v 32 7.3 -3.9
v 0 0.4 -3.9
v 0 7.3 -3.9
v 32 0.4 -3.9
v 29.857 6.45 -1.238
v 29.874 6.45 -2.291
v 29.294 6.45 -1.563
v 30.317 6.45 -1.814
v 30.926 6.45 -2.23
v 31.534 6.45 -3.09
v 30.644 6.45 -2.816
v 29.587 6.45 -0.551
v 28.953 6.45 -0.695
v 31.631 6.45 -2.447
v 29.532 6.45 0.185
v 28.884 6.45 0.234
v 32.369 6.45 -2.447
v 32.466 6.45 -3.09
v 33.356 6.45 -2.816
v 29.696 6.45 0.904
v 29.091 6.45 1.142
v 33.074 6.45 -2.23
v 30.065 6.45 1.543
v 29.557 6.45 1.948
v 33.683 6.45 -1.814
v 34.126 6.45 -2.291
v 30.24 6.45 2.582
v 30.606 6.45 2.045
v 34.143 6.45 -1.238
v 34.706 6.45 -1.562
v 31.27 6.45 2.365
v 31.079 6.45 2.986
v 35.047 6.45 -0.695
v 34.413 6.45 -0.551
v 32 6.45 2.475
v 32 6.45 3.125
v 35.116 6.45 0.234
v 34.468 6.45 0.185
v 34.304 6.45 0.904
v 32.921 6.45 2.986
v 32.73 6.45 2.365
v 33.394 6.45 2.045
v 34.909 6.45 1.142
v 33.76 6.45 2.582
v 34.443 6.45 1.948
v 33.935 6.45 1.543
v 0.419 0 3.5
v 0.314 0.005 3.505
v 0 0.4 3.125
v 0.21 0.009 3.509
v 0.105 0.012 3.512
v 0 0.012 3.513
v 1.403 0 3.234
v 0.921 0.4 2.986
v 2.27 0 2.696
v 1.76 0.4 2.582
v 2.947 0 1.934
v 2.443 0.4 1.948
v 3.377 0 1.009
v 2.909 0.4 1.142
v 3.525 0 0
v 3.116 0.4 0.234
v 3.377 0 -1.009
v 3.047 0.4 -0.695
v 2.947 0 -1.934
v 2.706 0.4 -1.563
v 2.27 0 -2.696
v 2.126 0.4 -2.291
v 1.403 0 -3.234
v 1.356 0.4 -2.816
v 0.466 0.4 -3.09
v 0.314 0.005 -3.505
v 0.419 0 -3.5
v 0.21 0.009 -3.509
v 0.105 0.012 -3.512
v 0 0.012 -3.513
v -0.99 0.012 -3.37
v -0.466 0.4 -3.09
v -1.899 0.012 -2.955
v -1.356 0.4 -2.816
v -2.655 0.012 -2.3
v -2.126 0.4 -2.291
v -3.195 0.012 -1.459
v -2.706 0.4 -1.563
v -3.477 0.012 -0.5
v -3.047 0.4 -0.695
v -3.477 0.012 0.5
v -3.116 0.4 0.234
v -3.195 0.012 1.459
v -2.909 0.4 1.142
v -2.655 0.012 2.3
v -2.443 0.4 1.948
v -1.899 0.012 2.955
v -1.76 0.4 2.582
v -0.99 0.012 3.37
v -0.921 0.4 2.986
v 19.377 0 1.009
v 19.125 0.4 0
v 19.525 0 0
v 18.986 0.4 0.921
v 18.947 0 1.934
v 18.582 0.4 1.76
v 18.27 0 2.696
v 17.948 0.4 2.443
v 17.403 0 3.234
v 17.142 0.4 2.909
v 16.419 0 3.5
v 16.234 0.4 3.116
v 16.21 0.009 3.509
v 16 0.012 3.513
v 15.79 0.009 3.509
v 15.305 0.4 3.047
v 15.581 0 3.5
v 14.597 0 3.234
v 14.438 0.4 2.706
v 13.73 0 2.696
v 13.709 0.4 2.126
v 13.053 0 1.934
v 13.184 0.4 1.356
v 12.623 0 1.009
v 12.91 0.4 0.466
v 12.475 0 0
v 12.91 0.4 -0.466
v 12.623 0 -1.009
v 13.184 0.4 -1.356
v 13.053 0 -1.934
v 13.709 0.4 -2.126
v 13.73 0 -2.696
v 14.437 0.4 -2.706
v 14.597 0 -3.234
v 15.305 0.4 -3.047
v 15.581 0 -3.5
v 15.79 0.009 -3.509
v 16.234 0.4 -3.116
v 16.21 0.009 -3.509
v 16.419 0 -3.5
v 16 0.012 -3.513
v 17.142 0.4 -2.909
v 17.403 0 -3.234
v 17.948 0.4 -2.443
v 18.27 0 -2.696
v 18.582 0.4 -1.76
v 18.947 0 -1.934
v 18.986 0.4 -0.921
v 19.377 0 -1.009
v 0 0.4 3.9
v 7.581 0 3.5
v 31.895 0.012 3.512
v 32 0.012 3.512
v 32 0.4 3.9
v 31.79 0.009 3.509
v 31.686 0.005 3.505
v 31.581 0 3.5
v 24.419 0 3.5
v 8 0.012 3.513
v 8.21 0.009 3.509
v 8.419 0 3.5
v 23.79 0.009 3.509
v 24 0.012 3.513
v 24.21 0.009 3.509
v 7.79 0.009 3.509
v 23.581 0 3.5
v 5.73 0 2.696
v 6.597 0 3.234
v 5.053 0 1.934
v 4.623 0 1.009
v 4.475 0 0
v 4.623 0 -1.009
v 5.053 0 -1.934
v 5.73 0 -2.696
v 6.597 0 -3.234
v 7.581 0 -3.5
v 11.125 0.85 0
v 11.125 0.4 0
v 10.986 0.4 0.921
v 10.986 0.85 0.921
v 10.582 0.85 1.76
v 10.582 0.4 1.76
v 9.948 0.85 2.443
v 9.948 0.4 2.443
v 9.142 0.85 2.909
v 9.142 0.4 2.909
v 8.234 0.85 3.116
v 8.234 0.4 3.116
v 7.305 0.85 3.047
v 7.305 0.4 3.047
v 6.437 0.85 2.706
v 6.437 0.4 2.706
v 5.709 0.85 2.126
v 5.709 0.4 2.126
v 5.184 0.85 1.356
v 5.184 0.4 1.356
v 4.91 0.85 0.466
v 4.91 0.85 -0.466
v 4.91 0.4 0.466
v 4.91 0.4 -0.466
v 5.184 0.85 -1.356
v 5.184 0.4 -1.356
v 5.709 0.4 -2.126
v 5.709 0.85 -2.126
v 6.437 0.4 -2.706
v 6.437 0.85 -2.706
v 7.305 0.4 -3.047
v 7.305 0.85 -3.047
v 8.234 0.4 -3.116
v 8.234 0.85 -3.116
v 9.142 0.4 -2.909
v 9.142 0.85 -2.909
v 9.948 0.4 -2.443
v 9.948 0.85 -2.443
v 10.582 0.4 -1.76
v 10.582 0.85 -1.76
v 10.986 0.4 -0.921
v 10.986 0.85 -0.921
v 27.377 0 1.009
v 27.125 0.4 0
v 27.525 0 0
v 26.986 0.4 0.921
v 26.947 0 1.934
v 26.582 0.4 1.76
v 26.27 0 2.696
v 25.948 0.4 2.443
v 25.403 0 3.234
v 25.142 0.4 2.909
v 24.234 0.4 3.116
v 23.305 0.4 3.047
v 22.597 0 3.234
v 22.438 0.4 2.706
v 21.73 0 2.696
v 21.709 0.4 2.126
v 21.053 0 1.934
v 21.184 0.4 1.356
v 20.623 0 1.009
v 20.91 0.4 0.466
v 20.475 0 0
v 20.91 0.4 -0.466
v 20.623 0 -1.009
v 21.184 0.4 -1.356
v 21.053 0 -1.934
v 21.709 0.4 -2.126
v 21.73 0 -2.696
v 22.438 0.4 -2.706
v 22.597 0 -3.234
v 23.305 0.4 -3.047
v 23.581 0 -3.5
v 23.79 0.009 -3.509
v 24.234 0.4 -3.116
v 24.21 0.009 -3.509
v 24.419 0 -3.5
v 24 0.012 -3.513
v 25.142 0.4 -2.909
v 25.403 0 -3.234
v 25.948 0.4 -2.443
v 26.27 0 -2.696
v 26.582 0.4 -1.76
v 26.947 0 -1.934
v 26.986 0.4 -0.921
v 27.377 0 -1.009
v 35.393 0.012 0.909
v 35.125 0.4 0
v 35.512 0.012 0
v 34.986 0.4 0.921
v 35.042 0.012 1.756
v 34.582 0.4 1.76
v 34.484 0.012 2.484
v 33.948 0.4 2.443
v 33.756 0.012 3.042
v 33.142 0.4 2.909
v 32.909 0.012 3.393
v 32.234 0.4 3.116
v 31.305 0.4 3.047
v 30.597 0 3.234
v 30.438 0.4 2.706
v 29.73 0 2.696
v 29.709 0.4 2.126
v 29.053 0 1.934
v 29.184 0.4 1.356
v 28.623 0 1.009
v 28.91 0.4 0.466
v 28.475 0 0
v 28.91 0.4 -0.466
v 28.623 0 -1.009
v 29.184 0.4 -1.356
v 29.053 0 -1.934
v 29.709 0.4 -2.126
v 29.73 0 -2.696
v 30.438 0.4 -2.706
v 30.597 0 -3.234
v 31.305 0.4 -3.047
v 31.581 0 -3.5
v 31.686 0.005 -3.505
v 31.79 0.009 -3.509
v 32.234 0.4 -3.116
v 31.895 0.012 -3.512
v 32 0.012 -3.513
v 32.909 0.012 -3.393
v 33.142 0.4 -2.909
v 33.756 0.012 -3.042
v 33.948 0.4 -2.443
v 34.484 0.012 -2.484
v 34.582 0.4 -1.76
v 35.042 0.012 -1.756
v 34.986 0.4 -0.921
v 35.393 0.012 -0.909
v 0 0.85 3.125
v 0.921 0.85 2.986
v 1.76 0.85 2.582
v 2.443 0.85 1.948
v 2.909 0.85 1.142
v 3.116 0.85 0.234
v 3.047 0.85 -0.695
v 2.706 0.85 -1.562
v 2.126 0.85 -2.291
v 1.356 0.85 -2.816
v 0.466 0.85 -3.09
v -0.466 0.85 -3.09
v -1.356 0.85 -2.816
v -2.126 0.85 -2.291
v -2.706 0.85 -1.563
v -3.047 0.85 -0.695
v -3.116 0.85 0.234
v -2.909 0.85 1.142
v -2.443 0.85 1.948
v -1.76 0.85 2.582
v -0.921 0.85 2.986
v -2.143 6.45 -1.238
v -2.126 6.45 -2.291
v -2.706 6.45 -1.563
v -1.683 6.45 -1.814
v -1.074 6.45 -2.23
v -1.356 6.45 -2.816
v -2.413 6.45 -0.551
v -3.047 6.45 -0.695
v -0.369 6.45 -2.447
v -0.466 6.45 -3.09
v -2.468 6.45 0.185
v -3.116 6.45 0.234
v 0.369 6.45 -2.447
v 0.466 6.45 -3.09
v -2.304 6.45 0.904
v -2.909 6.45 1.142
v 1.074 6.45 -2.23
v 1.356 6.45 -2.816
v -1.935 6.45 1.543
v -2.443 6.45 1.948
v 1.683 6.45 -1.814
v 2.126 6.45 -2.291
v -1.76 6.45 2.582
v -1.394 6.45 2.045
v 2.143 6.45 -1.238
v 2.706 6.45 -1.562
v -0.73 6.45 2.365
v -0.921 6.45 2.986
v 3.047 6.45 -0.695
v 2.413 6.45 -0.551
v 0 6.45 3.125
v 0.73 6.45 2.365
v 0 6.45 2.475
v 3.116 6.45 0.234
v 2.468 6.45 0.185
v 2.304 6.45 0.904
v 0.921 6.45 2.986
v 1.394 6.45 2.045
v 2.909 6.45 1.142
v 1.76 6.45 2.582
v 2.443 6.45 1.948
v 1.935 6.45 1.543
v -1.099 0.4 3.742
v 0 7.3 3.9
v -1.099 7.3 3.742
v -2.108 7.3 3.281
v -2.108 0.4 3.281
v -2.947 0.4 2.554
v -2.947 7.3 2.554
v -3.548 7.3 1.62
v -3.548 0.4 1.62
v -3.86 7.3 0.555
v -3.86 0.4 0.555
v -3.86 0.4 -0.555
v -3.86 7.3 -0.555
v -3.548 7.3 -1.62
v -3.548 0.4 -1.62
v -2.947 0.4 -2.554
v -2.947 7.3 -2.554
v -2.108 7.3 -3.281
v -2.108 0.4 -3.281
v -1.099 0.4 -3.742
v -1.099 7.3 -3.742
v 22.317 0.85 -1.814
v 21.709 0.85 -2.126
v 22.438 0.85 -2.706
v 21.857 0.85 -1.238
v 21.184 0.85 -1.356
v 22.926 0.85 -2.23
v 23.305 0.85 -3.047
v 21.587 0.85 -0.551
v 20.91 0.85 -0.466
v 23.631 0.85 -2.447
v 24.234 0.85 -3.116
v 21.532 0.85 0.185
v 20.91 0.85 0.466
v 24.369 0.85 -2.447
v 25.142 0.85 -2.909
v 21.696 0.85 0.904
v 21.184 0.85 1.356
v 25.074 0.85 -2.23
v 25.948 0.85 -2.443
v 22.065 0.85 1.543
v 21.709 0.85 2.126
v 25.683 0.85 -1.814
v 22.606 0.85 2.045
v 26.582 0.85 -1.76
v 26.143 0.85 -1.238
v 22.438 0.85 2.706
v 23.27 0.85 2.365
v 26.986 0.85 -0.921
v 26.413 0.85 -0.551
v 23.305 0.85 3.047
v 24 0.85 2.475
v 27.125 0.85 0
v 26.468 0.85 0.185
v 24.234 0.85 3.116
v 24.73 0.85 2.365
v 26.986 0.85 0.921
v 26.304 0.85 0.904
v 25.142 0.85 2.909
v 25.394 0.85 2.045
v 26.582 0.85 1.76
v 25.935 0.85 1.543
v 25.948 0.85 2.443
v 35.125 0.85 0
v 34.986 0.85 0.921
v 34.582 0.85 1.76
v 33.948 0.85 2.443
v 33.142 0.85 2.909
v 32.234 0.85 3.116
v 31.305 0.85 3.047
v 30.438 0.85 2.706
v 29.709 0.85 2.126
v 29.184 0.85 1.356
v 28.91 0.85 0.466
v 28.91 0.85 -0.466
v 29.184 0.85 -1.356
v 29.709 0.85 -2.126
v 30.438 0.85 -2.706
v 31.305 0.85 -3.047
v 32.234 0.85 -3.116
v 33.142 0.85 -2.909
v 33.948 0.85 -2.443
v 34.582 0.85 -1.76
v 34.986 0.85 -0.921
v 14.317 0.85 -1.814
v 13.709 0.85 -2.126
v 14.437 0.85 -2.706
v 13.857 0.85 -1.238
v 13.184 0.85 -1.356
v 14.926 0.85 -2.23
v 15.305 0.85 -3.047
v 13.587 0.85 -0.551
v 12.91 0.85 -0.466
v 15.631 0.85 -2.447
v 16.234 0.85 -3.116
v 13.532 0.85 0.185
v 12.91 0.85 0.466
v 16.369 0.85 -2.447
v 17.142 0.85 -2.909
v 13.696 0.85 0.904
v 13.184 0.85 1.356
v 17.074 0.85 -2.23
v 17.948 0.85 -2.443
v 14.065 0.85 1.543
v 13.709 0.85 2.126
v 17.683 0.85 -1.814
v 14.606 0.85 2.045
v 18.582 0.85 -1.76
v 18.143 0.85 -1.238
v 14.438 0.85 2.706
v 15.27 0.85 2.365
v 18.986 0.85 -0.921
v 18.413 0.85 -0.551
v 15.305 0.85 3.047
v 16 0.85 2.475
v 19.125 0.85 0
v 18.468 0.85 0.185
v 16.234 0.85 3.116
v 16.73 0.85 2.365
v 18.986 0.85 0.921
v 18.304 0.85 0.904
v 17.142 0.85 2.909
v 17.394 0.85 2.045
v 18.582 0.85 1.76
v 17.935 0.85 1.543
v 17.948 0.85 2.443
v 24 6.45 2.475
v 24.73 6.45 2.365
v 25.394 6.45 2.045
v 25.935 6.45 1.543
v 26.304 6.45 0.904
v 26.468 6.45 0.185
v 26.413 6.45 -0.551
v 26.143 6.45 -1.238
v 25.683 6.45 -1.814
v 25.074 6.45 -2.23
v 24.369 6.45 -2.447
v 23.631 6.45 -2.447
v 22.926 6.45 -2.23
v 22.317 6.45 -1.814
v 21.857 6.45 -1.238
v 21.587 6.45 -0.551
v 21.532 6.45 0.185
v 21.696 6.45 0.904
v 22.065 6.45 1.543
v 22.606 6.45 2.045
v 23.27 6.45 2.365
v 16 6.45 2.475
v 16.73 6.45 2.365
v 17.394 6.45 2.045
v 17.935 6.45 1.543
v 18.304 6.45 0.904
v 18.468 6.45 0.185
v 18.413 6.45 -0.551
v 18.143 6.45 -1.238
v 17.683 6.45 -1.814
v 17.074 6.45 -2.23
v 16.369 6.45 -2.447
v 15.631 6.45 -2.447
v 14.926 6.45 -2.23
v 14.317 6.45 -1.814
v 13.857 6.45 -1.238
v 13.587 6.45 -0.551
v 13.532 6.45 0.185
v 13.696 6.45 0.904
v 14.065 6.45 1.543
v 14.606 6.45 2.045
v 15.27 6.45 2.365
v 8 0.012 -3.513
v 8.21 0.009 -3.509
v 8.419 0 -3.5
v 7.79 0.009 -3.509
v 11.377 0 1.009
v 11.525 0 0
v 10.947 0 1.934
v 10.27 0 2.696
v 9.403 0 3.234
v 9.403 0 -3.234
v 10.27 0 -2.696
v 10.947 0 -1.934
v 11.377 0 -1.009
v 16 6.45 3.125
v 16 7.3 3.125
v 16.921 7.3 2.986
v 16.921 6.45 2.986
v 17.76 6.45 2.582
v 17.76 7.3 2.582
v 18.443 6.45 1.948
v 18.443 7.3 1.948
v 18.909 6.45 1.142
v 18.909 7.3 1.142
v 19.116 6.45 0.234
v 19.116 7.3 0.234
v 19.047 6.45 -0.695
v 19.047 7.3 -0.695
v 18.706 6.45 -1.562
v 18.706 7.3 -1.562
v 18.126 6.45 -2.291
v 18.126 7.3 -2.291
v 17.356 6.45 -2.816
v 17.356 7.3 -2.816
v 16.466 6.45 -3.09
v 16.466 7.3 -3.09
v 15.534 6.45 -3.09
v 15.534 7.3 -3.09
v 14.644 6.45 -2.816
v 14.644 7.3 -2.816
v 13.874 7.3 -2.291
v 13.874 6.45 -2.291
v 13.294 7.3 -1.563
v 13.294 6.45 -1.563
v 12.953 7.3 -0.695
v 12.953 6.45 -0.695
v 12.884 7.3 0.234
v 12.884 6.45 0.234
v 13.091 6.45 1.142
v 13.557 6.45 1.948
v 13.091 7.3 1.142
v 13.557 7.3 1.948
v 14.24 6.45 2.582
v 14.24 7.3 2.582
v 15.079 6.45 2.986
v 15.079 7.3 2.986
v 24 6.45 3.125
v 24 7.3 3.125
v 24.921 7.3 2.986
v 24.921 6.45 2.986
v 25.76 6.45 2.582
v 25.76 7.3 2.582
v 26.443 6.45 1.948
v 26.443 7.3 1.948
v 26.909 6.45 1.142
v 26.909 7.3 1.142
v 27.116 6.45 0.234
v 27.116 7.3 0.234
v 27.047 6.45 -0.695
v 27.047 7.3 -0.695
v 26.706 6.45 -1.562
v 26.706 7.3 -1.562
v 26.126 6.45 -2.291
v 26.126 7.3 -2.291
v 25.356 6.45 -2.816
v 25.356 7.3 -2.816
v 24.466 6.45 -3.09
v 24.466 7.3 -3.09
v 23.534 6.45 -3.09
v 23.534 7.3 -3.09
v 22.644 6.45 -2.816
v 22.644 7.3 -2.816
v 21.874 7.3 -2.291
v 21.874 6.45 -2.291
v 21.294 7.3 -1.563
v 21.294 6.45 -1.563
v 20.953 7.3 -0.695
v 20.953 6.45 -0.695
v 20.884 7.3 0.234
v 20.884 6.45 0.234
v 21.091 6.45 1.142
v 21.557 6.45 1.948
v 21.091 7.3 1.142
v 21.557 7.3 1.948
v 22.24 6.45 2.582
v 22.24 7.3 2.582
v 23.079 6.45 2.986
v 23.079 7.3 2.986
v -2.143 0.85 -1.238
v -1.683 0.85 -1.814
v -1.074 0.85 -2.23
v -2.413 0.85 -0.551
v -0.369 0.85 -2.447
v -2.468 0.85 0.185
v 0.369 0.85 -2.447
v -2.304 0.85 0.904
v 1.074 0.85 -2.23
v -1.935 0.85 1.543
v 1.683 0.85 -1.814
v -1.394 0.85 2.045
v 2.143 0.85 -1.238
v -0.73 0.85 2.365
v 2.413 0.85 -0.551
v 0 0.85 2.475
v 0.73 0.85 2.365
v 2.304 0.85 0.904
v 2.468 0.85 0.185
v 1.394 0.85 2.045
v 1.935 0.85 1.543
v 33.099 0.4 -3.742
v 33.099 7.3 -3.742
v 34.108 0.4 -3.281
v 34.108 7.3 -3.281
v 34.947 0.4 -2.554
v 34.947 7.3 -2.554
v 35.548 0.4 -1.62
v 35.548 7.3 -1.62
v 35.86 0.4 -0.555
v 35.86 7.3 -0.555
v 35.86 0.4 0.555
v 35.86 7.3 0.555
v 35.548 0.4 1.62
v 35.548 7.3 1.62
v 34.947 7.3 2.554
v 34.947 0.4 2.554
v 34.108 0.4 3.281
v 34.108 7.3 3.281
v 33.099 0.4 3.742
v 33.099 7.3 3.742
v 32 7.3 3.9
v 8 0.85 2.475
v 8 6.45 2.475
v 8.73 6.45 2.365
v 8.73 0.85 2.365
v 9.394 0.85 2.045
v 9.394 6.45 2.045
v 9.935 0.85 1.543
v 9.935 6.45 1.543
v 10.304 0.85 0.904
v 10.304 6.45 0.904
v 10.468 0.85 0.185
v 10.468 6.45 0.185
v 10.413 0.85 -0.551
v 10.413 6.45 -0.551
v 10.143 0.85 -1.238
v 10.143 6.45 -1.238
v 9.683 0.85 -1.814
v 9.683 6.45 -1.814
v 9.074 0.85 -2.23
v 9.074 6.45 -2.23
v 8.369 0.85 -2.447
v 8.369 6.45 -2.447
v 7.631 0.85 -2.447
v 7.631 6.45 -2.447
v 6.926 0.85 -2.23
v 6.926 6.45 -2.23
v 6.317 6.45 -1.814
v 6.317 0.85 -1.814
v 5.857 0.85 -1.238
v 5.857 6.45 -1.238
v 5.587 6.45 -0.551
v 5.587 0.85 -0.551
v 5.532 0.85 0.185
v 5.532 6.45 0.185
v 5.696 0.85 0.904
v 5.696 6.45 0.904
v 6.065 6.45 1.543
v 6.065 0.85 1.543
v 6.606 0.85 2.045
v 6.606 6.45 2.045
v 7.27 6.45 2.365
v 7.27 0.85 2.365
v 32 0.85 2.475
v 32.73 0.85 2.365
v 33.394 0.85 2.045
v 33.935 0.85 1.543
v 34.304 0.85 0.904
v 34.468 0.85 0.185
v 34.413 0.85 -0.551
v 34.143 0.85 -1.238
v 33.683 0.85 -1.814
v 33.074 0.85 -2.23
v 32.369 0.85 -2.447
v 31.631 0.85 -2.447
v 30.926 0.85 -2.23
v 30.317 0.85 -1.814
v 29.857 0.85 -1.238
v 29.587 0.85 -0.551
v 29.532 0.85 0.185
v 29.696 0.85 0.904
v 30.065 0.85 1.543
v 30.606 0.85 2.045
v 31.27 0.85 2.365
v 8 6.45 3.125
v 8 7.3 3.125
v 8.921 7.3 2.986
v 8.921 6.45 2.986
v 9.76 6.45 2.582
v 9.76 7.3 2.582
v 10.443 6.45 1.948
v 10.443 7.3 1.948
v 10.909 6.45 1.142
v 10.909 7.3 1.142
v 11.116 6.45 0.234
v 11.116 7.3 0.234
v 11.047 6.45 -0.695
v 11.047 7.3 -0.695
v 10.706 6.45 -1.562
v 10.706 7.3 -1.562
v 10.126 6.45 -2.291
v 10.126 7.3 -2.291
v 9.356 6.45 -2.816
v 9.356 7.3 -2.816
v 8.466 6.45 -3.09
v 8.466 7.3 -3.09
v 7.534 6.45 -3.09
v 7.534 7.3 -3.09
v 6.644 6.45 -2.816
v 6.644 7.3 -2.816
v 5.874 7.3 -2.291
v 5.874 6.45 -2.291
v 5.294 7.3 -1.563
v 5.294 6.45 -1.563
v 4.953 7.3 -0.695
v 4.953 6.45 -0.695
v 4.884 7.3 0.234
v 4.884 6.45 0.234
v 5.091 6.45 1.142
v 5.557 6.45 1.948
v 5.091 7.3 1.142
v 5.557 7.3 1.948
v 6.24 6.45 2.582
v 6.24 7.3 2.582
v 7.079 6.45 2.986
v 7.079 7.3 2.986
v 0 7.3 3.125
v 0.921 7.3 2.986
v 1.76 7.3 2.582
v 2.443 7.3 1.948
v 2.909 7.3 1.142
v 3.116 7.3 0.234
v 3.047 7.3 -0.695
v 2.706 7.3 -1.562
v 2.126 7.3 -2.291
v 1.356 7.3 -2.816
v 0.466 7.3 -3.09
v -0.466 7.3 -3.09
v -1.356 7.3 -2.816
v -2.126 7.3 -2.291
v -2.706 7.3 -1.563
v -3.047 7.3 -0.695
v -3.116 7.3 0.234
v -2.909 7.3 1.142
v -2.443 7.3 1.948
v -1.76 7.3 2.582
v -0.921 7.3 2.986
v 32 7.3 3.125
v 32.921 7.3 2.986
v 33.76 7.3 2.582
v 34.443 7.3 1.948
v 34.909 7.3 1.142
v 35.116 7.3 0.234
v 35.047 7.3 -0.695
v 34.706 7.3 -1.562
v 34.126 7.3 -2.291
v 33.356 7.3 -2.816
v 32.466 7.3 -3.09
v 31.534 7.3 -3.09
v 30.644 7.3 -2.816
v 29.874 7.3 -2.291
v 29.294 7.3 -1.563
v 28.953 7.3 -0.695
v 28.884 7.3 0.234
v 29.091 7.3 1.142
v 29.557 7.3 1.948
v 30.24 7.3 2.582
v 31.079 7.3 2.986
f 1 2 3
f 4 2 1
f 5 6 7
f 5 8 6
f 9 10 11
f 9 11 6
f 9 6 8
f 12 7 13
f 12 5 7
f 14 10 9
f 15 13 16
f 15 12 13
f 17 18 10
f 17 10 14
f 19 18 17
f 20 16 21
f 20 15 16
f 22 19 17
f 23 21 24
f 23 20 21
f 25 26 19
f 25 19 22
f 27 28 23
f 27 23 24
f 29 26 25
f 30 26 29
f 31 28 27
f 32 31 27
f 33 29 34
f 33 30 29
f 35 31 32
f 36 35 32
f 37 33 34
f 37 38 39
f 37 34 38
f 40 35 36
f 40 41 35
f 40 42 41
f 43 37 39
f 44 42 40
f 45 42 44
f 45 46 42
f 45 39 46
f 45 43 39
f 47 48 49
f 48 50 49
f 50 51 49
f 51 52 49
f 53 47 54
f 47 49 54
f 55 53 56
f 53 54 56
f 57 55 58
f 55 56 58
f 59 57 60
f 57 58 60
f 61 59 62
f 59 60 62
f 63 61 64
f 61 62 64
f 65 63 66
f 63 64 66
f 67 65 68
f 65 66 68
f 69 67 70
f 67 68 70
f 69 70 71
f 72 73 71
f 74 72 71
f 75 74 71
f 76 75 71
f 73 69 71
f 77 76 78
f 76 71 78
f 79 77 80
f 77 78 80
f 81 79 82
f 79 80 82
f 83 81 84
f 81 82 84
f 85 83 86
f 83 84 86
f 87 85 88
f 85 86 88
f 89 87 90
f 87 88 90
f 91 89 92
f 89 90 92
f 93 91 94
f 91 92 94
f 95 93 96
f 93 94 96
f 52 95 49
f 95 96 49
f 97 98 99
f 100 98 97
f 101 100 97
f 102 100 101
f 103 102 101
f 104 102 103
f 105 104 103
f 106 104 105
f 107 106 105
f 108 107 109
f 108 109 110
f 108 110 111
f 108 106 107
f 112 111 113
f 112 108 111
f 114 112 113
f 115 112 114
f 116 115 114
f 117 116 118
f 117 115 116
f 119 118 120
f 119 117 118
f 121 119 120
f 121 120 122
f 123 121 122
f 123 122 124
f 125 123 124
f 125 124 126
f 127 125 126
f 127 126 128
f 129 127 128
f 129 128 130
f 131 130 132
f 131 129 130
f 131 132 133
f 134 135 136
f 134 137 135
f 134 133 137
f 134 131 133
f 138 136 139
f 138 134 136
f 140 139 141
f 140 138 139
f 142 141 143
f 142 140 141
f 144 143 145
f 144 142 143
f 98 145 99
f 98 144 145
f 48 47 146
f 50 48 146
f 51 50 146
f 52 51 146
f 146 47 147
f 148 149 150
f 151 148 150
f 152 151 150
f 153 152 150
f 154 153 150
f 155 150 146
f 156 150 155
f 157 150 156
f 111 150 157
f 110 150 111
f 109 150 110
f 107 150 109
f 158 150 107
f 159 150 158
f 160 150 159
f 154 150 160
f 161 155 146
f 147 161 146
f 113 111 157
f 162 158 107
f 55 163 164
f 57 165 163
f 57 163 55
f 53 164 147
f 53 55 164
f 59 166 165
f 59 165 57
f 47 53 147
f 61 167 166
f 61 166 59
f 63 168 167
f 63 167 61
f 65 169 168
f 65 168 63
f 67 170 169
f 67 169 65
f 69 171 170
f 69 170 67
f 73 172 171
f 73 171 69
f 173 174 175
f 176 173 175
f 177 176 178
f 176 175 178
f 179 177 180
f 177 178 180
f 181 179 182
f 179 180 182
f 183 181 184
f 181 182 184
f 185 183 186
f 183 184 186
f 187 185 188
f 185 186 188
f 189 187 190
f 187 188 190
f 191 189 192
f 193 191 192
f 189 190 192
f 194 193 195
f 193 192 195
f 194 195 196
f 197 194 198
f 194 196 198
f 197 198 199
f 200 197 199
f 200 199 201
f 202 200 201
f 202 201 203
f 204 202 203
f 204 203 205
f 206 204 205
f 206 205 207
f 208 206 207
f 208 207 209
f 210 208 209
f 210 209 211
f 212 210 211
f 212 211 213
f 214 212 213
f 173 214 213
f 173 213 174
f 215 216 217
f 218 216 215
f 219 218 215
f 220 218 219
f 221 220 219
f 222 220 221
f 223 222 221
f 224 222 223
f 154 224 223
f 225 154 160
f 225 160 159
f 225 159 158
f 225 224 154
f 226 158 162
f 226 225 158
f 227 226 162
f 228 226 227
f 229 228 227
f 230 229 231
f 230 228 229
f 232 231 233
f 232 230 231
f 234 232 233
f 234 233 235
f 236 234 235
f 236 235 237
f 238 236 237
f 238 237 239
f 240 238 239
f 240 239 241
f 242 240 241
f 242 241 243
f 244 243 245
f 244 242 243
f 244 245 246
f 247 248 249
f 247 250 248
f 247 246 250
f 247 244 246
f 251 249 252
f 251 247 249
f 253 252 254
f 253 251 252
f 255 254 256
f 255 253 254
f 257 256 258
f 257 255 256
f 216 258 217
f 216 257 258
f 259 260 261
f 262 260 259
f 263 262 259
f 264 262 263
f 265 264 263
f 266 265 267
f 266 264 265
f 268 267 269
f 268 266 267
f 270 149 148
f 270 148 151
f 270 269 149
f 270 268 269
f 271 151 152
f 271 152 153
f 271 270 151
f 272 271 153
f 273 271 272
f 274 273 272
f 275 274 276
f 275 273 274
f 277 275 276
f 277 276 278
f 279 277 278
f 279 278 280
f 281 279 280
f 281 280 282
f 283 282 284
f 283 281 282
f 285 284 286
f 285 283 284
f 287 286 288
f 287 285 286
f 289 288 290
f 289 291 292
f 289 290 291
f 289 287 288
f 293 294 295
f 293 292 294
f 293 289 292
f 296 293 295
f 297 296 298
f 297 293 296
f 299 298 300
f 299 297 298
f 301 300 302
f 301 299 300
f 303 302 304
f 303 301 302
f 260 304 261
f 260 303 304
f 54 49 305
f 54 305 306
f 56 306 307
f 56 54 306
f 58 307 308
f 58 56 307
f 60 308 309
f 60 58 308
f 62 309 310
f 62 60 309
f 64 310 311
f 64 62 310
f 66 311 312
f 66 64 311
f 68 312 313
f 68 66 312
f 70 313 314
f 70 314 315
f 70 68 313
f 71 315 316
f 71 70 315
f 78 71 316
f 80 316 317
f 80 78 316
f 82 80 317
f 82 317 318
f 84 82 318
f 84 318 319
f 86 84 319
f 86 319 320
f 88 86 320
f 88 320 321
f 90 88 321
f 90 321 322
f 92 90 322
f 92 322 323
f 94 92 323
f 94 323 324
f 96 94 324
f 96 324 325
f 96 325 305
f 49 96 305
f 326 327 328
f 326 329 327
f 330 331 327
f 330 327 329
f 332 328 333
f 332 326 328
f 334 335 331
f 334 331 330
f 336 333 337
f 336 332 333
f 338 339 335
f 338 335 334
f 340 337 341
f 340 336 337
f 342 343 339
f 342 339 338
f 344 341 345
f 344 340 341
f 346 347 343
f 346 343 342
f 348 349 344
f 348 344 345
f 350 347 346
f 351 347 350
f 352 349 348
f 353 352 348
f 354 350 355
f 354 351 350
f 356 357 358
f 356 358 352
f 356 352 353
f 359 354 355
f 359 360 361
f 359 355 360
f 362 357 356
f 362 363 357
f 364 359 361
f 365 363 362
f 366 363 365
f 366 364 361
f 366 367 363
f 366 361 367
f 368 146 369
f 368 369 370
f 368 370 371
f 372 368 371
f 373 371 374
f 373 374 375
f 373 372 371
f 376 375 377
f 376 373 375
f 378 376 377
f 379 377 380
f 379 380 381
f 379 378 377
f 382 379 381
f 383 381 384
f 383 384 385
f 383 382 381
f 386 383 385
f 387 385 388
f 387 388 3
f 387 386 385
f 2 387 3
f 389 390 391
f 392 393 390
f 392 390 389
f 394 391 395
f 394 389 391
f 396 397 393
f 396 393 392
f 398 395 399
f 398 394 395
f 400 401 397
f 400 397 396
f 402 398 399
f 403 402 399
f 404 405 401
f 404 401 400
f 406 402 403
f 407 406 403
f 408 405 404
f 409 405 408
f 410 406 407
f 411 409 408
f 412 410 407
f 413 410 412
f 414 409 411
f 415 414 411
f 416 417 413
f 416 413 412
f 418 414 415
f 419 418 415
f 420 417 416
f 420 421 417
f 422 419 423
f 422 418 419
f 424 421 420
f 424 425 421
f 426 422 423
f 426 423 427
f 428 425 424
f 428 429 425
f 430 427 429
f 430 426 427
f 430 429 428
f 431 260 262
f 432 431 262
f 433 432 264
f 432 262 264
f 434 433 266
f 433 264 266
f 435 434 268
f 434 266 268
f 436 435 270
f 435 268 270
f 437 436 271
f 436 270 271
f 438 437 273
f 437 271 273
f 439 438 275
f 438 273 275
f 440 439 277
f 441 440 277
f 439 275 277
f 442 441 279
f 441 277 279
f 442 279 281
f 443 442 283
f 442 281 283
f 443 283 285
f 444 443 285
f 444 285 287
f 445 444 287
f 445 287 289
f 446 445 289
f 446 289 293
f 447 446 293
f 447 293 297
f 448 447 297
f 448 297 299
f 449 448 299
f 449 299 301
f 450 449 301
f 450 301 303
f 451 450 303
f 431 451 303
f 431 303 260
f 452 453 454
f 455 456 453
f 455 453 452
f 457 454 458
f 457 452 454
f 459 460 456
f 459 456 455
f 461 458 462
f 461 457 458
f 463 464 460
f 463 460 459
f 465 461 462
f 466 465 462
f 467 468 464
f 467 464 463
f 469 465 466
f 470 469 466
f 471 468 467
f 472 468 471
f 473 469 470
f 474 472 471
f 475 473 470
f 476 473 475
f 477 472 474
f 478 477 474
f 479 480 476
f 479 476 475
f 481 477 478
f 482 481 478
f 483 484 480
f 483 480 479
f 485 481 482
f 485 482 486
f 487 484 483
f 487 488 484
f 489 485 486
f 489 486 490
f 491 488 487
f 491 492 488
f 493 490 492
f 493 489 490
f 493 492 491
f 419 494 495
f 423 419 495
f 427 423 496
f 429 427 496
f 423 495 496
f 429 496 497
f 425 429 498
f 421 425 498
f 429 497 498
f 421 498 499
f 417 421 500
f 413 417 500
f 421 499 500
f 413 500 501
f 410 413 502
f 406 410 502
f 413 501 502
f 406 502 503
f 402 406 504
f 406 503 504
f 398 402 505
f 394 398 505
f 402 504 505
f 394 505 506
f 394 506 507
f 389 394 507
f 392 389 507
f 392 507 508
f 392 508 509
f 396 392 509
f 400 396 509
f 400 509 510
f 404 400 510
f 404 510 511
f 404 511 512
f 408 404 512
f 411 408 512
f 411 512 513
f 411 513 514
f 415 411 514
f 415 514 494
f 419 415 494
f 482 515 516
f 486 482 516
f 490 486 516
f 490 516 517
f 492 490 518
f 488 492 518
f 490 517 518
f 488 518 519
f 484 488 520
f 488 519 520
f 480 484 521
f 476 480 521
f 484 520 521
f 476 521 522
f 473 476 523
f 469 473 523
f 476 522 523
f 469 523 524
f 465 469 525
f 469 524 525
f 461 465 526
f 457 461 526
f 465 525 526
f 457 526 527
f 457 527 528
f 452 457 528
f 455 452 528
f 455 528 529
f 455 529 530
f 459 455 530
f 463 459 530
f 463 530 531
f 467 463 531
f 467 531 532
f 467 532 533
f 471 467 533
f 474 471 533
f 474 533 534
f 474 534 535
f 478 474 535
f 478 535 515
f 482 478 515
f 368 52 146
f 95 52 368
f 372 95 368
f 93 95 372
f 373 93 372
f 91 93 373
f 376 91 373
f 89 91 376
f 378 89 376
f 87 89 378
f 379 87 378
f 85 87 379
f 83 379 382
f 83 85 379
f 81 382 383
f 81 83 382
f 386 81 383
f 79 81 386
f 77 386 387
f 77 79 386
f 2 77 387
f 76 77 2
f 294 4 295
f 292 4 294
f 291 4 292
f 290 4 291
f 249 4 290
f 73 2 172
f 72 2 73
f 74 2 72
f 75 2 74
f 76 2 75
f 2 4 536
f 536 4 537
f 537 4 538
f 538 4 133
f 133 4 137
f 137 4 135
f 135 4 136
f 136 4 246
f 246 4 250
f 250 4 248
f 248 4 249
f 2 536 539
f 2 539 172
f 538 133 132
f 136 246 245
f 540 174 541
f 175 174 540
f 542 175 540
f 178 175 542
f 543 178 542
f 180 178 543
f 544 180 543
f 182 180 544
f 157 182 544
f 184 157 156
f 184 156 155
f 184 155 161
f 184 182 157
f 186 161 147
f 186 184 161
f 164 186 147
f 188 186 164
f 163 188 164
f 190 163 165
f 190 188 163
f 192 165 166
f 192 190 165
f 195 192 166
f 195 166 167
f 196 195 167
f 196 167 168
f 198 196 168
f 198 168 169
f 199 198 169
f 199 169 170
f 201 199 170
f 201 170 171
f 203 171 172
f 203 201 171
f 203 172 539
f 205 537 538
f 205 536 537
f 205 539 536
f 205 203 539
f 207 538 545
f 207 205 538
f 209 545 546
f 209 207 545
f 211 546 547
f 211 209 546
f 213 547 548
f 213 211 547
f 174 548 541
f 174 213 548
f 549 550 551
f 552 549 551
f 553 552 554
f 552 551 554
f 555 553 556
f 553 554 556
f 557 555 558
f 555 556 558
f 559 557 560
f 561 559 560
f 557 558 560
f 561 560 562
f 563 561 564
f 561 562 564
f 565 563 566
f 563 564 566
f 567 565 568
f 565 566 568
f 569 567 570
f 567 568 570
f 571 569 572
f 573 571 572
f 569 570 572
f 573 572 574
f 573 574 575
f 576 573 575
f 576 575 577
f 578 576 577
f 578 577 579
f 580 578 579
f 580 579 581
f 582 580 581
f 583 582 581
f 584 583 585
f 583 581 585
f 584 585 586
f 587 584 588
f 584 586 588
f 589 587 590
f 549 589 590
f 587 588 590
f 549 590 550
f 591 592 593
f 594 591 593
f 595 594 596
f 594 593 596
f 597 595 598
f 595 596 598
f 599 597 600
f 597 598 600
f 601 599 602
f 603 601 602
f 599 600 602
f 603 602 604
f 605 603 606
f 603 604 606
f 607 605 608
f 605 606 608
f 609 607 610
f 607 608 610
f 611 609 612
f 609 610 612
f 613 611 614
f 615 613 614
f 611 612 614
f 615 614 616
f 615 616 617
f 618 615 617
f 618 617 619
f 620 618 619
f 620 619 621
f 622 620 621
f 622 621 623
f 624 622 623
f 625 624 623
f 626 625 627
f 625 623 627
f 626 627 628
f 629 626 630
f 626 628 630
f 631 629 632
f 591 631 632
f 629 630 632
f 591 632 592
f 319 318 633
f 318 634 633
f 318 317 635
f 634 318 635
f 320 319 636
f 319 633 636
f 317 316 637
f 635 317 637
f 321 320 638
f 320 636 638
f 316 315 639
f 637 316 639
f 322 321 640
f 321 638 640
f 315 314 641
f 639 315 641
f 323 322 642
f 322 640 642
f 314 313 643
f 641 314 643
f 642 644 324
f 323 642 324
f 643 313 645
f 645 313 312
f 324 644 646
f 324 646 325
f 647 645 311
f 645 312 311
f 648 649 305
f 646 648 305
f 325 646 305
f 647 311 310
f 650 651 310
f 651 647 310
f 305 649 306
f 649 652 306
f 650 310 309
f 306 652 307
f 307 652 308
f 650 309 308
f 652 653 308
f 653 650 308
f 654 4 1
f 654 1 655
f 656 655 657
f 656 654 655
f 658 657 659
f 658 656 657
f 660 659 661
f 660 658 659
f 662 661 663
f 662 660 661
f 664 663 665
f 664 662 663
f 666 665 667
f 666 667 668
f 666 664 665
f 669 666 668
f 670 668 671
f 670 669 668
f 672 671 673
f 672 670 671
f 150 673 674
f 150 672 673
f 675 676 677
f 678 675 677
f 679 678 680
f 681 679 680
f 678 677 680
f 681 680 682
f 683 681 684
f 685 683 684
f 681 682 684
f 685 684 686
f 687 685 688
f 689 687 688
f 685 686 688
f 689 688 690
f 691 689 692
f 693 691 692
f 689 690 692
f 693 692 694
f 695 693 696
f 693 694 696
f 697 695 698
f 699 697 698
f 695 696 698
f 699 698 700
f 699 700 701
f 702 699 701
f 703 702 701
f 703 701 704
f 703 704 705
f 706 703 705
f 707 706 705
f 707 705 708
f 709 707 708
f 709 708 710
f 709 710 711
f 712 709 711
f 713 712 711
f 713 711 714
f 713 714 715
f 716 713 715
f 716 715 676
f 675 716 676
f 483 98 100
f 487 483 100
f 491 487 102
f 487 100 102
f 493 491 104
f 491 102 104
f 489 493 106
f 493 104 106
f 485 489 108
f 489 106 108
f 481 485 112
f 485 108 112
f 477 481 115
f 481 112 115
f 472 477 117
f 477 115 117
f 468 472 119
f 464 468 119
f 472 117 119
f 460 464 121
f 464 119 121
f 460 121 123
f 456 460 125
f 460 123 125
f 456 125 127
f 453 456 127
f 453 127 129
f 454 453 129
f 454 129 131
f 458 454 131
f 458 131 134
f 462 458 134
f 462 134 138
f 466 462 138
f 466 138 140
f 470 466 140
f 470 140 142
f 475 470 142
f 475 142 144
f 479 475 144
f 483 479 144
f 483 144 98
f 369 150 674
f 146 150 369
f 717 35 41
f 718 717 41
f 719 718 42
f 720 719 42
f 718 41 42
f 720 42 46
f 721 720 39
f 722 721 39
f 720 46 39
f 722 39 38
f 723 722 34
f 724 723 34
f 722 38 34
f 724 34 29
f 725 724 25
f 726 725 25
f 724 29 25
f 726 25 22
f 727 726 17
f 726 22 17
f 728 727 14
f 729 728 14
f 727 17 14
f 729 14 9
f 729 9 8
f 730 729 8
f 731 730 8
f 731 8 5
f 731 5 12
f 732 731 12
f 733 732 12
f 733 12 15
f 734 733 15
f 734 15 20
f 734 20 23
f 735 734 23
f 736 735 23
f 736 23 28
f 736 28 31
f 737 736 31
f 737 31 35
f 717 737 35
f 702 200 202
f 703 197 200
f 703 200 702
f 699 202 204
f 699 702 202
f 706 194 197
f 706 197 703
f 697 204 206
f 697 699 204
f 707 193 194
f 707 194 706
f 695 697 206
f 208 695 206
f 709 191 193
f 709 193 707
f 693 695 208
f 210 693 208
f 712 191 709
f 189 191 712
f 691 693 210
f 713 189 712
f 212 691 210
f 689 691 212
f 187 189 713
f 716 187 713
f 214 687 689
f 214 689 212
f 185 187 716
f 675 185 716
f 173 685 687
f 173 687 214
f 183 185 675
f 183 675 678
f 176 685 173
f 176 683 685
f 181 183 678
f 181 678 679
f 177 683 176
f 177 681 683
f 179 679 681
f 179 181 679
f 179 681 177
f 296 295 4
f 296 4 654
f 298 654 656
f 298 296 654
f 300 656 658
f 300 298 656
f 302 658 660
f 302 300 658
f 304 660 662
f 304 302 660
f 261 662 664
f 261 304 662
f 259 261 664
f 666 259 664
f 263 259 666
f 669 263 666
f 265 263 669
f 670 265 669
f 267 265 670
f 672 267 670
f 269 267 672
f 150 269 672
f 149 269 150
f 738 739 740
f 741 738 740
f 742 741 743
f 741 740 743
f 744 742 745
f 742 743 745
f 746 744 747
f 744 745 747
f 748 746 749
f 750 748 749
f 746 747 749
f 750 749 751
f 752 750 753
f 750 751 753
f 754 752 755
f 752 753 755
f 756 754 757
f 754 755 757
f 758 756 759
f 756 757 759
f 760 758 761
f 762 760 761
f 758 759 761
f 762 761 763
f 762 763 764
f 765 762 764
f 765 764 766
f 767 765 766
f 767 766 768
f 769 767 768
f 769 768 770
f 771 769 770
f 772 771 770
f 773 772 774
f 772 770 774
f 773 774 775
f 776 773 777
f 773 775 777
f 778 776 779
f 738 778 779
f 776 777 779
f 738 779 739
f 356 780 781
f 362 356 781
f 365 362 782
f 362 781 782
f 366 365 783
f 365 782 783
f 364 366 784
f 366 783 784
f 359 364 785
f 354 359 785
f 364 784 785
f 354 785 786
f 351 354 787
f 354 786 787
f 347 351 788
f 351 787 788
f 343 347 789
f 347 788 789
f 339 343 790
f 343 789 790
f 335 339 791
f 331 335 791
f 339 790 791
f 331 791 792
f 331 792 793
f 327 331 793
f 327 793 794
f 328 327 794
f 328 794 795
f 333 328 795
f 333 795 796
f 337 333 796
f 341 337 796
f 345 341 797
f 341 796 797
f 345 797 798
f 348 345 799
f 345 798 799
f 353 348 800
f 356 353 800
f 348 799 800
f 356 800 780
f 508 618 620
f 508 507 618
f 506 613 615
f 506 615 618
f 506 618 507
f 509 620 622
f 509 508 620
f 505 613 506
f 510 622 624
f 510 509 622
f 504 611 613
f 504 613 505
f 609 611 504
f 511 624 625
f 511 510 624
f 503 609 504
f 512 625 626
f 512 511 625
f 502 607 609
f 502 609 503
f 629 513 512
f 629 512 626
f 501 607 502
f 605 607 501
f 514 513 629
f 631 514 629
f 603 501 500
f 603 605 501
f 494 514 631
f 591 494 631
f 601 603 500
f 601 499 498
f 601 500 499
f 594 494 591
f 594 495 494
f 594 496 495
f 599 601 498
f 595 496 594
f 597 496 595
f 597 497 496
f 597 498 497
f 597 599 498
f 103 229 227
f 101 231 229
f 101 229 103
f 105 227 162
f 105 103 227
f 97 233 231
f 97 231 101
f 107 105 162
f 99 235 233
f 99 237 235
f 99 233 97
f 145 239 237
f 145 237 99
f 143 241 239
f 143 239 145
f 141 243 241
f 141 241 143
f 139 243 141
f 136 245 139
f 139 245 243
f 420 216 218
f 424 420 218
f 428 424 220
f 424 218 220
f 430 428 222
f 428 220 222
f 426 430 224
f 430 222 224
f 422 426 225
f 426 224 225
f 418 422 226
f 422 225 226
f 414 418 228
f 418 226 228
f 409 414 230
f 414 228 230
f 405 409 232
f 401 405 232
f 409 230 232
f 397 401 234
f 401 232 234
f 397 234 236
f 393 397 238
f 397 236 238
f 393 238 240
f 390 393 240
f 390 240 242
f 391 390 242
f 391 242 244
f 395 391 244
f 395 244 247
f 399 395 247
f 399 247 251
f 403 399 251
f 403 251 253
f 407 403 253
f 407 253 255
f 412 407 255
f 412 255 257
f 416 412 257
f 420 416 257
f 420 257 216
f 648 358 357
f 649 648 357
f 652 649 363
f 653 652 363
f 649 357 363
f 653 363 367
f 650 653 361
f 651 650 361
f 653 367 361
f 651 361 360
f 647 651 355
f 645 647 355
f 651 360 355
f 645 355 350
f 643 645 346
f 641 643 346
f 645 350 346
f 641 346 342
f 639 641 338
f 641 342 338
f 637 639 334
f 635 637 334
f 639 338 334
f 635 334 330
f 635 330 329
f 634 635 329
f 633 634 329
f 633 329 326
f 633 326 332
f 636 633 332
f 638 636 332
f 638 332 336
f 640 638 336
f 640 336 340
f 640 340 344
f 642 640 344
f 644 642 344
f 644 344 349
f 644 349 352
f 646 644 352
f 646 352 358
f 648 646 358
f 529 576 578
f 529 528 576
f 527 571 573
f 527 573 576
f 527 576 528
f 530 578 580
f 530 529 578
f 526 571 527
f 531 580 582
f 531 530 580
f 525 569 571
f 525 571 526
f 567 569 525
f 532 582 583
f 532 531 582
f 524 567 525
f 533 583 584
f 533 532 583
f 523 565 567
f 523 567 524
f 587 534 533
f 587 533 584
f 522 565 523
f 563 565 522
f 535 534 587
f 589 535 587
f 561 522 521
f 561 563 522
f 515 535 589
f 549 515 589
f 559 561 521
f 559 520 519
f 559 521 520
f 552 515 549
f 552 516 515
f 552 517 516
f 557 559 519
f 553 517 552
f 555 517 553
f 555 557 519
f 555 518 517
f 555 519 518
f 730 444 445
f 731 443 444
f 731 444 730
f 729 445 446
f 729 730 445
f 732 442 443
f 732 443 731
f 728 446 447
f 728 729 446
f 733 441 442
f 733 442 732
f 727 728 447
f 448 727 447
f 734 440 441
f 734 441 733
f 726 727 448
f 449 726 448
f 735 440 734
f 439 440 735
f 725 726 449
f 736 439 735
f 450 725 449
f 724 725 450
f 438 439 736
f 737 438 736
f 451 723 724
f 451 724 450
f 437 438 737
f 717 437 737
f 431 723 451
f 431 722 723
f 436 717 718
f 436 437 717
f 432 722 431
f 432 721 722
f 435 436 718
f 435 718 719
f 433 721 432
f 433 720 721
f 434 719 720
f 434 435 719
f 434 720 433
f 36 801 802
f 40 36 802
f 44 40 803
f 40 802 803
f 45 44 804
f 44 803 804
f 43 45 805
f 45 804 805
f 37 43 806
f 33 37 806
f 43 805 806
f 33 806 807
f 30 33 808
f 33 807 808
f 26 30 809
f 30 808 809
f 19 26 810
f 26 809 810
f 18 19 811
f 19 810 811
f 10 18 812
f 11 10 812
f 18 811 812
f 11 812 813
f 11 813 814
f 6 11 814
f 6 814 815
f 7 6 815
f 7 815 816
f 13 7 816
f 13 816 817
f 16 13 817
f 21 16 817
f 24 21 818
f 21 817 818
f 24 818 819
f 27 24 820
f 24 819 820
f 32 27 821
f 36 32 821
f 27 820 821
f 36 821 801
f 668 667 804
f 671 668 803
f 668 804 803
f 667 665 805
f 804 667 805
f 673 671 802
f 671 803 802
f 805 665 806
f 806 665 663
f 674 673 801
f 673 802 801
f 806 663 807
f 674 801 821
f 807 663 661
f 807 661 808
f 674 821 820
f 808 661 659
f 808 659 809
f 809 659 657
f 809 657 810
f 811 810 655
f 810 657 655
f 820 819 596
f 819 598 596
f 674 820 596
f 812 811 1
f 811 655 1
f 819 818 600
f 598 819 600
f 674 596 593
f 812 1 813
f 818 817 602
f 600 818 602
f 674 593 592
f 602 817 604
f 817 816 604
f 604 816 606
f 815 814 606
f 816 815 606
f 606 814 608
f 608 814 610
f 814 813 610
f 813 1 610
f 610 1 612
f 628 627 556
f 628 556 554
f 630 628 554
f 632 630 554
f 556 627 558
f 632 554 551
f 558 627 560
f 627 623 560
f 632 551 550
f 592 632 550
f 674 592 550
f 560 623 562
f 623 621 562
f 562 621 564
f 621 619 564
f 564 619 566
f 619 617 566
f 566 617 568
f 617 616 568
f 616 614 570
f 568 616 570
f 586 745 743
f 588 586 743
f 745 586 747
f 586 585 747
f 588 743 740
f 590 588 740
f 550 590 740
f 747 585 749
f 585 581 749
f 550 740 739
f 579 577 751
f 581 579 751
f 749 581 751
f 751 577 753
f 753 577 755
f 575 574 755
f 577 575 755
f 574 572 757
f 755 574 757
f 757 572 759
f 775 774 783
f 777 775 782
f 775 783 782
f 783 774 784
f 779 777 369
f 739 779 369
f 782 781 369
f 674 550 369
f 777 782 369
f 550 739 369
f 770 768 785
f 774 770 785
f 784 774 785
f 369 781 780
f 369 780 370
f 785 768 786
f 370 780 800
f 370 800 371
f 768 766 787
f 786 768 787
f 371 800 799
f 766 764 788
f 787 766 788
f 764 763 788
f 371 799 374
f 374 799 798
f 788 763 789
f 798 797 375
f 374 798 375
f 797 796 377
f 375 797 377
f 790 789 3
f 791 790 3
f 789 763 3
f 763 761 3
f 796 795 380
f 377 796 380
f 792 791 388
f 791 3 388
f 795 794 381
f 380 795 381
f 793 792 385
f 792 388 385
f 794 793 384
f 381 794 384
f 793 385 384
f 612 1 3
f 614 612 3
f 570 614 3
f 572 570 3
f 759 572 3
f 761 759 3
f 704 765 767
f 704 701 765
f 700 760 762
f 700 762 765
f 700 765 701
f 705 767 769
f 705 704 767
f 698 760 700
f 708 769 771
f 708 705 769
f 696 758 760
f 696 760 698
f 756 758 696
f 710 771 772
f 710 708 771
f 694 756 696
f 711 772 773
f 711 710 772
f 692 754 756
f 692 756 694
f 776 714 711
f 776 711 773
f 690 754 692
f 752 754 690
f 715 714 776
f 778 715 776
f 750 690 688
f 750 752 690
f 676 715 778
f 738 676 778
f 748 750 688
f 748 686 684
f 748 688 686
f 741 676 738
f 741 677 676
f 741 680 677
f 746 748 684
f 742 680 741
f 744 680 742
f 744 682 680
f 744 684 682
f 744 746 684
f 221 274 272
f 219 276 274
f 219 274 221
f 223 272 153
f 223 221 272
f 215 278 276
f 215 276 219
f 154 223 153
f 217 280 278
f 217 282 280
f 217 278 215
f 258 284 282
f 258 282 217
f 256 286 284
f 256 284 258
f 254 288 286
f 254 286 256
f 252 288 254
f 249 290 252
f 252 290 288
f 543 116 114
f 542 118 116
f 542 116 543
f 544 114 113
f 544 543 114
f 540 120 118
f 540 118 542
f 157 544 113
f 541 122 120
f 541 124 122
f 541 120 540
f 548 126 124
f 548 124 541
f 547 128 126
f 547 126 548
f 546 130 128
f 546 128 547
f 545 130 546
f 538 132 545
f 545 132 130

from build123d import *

# Parameters (mm, degrees)
BOSS_EXTRUDE1_DEPTH       = 7.3
SKETCH2_R                 = 2.475
CUT_EXTRUDE1_DEPTH        = 37.841688344
SKETCH3_R                 = 3.125
CUT_EXTRUDE2_DEPTH        = 0.85
LPATTERN1_COUNT           = 5
LPATTERN1_PITCH           = 8
LPATTERN1_COPY_1_SKETCH_R = 3.125
LPATTERN1_COPY_1_DEPTH    = 0.85
LPATTERN1_COPY_2_SKETCH_R = 3.125
LPATTERN1_COPY_2_DEPTH    = 0.85
LPATTERN1_COPY_3_SKETCH_R = 3.125
LPATTERN1_COPY_3_DEPTH    = 0.85
LPATTERN1_COPY_4_SKETCH_R = 3.125
LPATTERN1_COPY_4_DEPTH    = 0.85
CHAMFER1_SIZE             = 0.4


with BuildPart() as part:
    # Sketch1 → Boss-Extrude1 (new body)
    with BuildSketch(Plane(origin=(0, 0, 0), x_dir=(1, 0, 0), z_dir=(0, 1, 0))):
        with BuildLine():
            Line((0, 3.9), (32, 3.9))
            ThreePointArc((32, 3.9), (35.9, 0), (32, -3.9))
            Line((32, -3.9), (0, -3.9))
            ThreePointArc((0, -3.9), (-3.9, 0), (0, 3.9))
        make_face()
    extrude(amount=BOSS_EXTRUDE1_DEPTH)

    # Sketch2 → Cut-Extrude1 (cut, through all)
    with BuildSketch(Plane(origin=(0, 7.3, 0), x_dir=(1, 0, 0), z_dir=(0, 1, 0))):
        with Locations(Location((0, 0, 0), (0, 0, 270))):
            Circle(SKETCH2_R)
    cut_extrude1 = extrude(amount=-CUT_EXTRUDE1_DEPTH, mode=Mode.SUBTRACT)

    # Sketch3 → Cut-Extrude2 (cut)
    with BuildSketch(Plane(origin=(0, 7.3, 0), x_dir=(1, 0, 0), z_dir=(0, 1, 0))):
        with Locations(Location((0, 0, 0), (0, 0, 270))):
            Circle(SKETCH3_R)
    cut_extrude2 = extrude(amount=-CUT_EXTRUDE2_DEPTH, mode=Mode.SUBTRACT)

    # Mirror1: Cut-Extrude2 across plane
    add(cut_extrude2.mirror(Plane.ZX.offset(3.65)), mode=Mode.SUBTRACT)

    # LPattern1: Cut-Extrude1, Cut-Extrude2 ×5
    with Locations(*[(i * LPATTERN1_PITCH, 0, 0) for i in range(1, LPATTERN1_COUNT)]):
        add(cut_extrude1, mode=Mode.SUBTRACT)
        add(cut_extrude2, mode=Mode.SUBTRACT)

    # LPattern1 copy 1 sketch → LPattern1 copy 1 (cut)
    with BuildSketch(Plane(origin=(8, 0, 0), x_dir=(1, 0, 0), z_dir=(0, -1, 0))):
        Circle(LPATTERN1_COPY_1_SKETCH_R)
    extrude(amount=-LPATTERN1_COPY_1_DEPTH, mode=Mode.SUBTRACT)

    # LPattern1 copy 2 sketch → LPattern1 copy 2 (cut)
    with BuildSketch(Plane(origin=(16, 0, 0), x_dir=(1, 0, 0), z_dir=(0, -1, 0))):
        Circle(LPATTERN1_COPY_2_SKETCH_R)
    extrude(amount=-LPATTERN1_COPY_2_DEPTH, mode=Mode.SUBTRACT)

    # LPattern1 copy 3 sketch → LPattern1 copy 3 (cut)
    with BuildSketch(Plane(origin=(24, 0, 0), x_dir=(1, 0, 0), z_dir=(0, -1, 0))):
        Circle(LPATTERN1_COPY_3_SKETCH_R)
    extrude(amount=-LPATTERN1_COPY_3_DEPTH, mode=Mode.SUBTRACT)

    # LPattern1 copy 4 sketch → LPattern1 copy 4 (cut)
    with BuildSketch(Plane(origin=(32, 0, 0), x_dir=(1, 0, 0), z_dir=(0, -1, 0))):
        Circle(LPATTERN1_COPY_4_SKETCH_R)
    extrude(amount=-LPATTERN1_COPY_4_DEPTH, mode=Mode.SUBTRACT)

    # Chamfer1
    # the kernel refuses this chamfer: 0.4 mm, written as the material it takes off along each edge
    with BuildSketch(Plane(origin=(0, 0, 0), x_dir=(0, 0, 1), z_dir=(-1, 0, 0))) as chamfer1_piece_1:
        Polygon((3.125 + CHAMFER1_SIZE, 0), (3.125, CHAMFER1_SIZE), (3.125, 0), align=None)
    revolve(axis=Axis((0, 0, 0), (0, 1, 0)), mode=Mode.SUBTRACT)
    with BuildSketch(Plane(origin=(0, 0, -3.9), x_dir=(0, 0.9996219169112968, -0.027495876610586275), z_dir=(1, 0, 0))) as chamfer1_piece_2:
        Polygon((CHAMFER1_SIZE * 0.999621916911, CHAMFER1_SIZE * 0.0274958766106), (-CHAMFER1_SIZE * 0.0274958766106, CHAMFER1_SIZE * 0.999621916911), (0, 0), align=None)
    extrude(amount=32, mode=Mode.SUBTRACT)
    with BuildSketch(Plane(origin=(32, 0, 0), x_dir=(0, 0, -1), z_dir=(-1, 0, 0))) as chamfer1_piece_3:
        Polygon((3.9, -CHAMFER1_SIZE), (3.9 - CHAMFER1_SIZE, 0), (3.9, 0), align=None)
    revolve(axis=Axis((32, 0, 0), (0, -1, 0)), revolution_arc=180, mode=Mode.SUBTRACT)
    with BuildSketch(Plane(origin=(32, 0, 3.9), x_dir=(0, -0.027495876610586386, -0.9996219169112968), z_dir=(-1, 0, 0))) as chamfer1_piece_4:
        Polygon((CHAMFER1_SIZE * 0.999621916911, -CHAMFER1_SIZE * 0.0274958766106), (-CHAMFER1_SIZE * 0.0274958766106, -CHAMFER1_SIZE * 0.999621916911), (0, 0), align=None)
    extrude(amount=32, mode=Mode.SUBTRACT)
    with BuildSketch(Plane(origin=(0, 0, 0), x_dir=(0, 0, 1), z_dir=(1, 0, 0))) as chamfer1_piece_5:
        Polygon((3.9, -CHAMFER1_SIZE), (3.9 - CHAMFER1_SIZE, 0), (3.9, 0), align=None)
    revolve(axis=Axis((0, 0, 0), (0, -1, 0)), revolution_arc=180, mode=Mode.SUBTRACT)
    with BuildSketch(Plane(origin=(8, 0, 0), x_dir=(1, 0, 0), z_dir=(0, 0, -1))) as chamfer1_piece_6:
        Polygon((3.125 + CHAMFER1_SIZE, 0), (3.125, -CHAMFER1_SIZE), (3.125, 0), align=None)
    revolve(axis=Axis((8, 0, 0), (0, -1, 0)), mode=Mode.SUBTRACT)
    with BuildSketch(Plane(origin=(16, 0, 0), x_dir=(1, 0, 0), z_dir=(0, 0, -1))) as chamfer1_piece_7:
        Polygon((3.125 + CHAMFER1_SIZE, 0), (3.125, -CHAMFER1_SIZE), (3.125, 0), align=None)
    revolve(axis=Axis((16, 0, 0), (0, -1, 0)), mode=Mode.SUBTRACT)
    with BuildSketch(Plane(origin=(24, 0, 0), x_dir=(1, 0, 0), z_dir=(0, 0, -1))) as chamfer1_piece_8:
        Polygon((3.125 + CHAMFER1_SIZE, 0), (3.125, -CHAMFER1_SIZE), (3.125, 0), align=None)
    revolve(axis=Axis((24, 0, 0), (0, -1, 0)), mode=Mode.SUBTRACT)
    with BuildSketch(Plane(origin=(32, 0, 0), x_dir=(1, 0, 0), z_dir=(0, 0, -1))) as chamfer1_piece_9:
        Polygon((3.125 + CHAMFER1_SIZE, 0), (3.125, -CHAMFER1_SIZE), (3.125, 0), align=None)
    revolve(axis=Axis((32, 0, 0), (0, -1, 0)), mode=Mode.SUBTRACT)


solid = part.part
